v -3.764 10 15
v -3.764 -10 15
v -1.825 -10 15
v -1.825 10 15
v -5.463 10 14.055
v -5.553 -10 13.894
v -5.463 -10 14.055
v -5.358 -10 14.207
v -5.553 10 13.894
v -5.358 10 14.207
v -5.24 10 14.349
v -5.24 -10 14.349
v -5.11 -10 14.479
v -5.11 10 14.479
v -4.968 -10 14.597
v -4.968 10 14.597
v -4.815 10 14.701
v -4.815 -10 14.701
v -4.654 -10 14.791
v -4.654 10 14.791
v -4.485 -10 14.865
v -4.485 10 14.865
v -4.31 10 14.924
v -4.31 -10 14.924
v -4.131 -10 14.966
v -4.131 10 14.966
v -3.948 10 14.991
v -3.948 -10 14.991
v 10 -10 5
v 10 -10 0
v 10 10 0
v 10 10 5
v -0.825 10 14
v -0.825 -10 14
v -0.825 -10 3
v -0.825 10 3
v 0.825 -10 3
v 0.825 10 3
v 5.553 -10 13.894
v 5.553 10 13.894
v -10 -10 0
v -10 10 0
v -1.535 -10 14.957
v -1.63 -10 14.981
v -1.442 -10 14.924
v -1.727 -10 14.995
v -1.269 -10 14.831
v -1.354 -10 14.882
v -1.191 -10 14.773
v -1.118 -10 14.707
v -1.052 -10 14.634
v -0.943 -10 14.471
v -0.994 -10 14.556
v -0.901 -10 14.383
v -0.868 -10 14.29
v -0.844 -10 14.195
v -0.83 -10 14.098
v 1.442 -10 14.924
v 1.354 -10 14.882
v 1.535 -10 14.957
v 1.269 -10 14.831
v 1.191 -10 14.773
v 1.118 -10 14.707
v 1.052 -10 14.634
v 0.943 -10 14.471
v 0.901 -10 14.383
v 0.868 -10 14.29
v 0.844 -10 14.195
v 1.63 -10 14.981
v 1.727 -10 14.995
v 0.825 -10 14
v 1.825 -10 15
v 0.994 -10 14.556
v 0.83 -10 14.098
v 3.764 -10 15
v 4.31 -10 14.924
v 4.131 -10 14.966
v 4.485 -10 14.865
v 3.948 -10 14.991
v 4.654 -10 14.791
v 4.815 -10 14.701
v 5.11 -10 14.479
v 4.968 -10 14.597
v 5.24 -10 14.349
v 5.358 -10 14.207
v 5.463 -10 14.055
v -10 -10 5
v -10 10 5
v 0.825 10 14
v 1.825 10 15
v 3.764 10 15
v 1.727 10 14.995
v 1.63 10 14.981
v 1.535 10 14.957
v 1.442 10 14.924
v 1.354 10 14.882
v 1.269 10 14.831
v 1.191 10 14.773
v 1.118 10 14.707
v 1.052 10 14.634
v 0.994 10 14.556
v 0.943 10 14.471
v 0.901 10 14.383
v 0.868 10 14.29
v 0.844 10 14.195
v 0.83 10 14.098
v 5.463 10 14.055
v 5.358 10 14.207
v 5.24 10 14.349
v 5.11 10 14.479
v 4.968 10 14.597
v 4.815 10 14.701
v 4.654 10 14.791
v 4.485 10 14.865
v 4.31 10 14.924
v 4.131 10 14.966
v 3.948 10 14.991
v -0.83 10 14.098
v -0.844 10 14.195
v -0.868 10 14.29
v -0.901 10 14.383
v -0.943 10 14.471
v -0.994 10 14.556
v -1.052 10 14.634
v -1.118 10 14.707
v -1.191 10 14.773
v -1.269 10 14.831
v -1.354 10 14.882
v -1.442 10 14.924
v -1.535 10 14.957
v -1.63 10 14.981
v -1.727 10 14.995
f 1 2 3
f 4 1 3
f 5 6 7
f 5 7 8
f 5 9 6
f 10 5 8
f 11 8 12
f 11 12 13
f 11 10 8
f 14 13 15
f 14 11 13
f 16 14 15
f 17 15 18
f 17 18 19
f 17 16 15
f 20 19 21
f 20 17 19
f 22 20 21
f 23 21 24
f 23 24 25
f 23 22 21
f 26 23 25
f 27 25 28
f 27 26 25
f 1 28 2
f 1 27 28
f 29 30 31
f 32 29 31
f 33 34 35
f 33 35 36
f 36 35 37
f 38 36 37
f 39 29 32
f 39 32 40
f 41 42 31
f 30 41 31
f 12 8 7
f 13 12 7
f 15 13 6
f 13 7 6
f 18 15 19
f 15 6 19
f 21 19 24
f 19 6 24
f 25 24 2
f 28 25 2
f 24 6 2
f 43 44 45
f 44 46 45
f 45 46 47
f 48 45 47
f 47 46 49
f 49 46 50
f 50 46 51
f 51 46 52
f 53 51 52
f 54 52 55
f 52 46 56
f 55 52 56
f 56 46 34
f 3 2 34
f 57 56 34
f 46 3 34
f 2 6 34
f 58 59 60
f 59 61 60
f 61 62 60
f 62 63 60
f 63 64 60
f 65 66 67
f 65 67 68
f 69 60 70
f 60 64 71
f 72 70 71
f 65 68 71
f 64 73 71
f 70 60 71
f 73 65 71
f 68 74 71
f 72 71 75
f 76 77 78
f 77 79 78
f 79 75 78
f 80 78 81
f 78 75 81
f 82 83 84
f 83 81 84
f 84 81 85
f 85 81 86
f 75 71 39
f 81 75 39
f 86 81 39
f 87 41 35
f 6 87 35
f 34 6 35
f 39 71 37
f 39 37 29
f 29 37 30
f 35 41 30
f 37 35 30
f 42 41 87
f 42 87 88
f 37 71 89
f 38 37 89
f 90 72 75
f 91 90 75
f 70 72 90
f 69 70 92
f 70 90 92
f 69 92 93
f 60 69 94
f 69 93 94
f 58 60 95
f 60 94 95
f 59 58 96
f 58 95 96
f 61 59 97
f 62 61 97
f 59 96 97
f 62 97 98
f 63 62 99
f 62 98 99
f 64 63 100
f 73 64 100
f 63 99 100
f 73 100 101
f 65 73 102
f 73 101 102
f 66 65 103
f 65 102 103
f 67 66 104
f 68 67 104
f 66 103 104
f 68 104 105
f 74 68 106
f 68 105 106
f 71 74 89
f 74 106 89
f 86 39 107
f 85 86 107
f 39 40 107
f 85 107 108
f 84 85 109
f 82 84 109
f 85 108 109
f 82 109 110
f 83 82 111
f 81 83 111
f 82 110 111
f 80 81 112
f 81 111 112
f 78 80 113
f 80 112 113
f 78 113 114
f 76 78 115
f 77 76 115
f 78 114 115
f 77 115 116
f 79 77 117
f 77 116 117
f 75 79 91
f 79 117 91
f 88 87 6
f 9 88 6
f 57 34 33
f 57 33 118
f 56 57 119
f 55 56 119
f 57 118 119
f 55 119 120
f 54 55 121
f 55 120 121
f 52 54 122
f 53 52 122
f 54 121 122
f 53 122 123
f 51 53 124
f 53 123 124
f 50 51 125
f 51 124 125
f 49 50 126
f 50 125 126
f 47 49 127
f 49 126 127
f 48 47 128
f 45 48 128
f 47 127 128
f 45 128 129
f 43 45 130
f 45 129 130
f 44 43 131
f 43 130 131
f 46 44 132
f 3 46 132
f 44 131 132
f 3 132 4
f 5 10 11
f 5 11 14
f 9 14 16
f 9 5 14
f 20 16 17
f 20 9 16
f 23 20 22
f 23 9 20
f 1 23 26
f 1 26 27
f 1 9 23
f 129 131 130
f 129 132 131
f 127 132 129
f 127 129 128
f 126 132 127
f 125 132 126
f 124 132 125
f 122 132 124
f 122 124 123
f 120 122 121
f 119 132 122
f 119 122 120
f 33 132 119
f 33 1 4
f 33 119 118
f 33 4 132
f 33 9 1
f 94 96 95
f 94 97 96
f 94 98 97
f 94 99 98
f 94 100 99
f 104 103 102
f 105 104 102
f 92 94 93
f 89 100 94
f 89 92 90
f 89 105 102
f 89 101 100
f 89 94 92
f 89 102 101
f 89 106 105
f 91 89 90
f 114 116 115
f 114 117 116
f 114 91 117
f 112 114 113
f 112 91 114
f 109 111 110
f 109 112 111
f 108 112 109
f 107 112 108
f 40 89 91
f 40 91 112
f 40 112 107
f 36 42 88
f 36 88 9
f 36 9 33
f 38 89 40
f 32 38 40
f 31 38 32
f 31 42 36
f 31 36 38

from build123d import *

# Parameters (mm, degrees)
SKETCH_W        = 20
SKETCH_H        = 20
PAD_DEPTH       = 15
SKETCH001_W     = 1.65
SKETCH001_H     = 20
POCKET_DEPTH    = 12
POCKET001_DEPTH = 20
FILLET_R        = 2
FILLET001_R     = 1


with BuildPart() as part:
    # Sketch → Pad (new body)
    with BuildSketch(Plane.XY):
        Rectangle(SKETCH_W, SKETCH_H)
    extrude(amount=PAD_DEPTH)

    # Sketch001 (on Face6 of Pad) → Pocket (cut)
    with BuildSketch(Plane.XY.offset(15)):
        Rectangle(SKETCH001_W, SKETCH001_H)
    extrude(amount=-POCKET_DEPTH, mode=Mode.SUBTRACT)

    # Sketch002 (on Face10 of Pocket) → Pocket001 (cut)
    with BuildSketch(Plane.XZ.offset(10)):
        Polygon((-10, 5), (-5, 15), (-10, 15), align=None)
    pocket001 = extrude(amount=-POCKET001_DEPTH, mode=Mode.SUBTRACT)

    # Mirrored: Pocket001 across Sketch002 V_Axis
    add(pocket001.mirror(Plane(origin=(0, -10, 0), x_dir=(0, -1, 0), z_dir=(1, 0, 0))), mode=Mode.SUBTRACT)

    # Fillet
    fillet_edges = [part.edges().sort_by_distance(p)[0] for p in [
        (5, 0, 15),
        (-5, 0, 15),
    ]]
    fillet(fillet_edges, radius=FILLET_R)

    # Fillet001
    fillet001_edges = [part.edges().sort_by_distance(p)[0] for p in [
        (-0.825, 0, 15),
        (0.825, 0, 15),
    ]]
    fillet(fillet001_edges, radius=FILLET001_R)


solid = part.part
